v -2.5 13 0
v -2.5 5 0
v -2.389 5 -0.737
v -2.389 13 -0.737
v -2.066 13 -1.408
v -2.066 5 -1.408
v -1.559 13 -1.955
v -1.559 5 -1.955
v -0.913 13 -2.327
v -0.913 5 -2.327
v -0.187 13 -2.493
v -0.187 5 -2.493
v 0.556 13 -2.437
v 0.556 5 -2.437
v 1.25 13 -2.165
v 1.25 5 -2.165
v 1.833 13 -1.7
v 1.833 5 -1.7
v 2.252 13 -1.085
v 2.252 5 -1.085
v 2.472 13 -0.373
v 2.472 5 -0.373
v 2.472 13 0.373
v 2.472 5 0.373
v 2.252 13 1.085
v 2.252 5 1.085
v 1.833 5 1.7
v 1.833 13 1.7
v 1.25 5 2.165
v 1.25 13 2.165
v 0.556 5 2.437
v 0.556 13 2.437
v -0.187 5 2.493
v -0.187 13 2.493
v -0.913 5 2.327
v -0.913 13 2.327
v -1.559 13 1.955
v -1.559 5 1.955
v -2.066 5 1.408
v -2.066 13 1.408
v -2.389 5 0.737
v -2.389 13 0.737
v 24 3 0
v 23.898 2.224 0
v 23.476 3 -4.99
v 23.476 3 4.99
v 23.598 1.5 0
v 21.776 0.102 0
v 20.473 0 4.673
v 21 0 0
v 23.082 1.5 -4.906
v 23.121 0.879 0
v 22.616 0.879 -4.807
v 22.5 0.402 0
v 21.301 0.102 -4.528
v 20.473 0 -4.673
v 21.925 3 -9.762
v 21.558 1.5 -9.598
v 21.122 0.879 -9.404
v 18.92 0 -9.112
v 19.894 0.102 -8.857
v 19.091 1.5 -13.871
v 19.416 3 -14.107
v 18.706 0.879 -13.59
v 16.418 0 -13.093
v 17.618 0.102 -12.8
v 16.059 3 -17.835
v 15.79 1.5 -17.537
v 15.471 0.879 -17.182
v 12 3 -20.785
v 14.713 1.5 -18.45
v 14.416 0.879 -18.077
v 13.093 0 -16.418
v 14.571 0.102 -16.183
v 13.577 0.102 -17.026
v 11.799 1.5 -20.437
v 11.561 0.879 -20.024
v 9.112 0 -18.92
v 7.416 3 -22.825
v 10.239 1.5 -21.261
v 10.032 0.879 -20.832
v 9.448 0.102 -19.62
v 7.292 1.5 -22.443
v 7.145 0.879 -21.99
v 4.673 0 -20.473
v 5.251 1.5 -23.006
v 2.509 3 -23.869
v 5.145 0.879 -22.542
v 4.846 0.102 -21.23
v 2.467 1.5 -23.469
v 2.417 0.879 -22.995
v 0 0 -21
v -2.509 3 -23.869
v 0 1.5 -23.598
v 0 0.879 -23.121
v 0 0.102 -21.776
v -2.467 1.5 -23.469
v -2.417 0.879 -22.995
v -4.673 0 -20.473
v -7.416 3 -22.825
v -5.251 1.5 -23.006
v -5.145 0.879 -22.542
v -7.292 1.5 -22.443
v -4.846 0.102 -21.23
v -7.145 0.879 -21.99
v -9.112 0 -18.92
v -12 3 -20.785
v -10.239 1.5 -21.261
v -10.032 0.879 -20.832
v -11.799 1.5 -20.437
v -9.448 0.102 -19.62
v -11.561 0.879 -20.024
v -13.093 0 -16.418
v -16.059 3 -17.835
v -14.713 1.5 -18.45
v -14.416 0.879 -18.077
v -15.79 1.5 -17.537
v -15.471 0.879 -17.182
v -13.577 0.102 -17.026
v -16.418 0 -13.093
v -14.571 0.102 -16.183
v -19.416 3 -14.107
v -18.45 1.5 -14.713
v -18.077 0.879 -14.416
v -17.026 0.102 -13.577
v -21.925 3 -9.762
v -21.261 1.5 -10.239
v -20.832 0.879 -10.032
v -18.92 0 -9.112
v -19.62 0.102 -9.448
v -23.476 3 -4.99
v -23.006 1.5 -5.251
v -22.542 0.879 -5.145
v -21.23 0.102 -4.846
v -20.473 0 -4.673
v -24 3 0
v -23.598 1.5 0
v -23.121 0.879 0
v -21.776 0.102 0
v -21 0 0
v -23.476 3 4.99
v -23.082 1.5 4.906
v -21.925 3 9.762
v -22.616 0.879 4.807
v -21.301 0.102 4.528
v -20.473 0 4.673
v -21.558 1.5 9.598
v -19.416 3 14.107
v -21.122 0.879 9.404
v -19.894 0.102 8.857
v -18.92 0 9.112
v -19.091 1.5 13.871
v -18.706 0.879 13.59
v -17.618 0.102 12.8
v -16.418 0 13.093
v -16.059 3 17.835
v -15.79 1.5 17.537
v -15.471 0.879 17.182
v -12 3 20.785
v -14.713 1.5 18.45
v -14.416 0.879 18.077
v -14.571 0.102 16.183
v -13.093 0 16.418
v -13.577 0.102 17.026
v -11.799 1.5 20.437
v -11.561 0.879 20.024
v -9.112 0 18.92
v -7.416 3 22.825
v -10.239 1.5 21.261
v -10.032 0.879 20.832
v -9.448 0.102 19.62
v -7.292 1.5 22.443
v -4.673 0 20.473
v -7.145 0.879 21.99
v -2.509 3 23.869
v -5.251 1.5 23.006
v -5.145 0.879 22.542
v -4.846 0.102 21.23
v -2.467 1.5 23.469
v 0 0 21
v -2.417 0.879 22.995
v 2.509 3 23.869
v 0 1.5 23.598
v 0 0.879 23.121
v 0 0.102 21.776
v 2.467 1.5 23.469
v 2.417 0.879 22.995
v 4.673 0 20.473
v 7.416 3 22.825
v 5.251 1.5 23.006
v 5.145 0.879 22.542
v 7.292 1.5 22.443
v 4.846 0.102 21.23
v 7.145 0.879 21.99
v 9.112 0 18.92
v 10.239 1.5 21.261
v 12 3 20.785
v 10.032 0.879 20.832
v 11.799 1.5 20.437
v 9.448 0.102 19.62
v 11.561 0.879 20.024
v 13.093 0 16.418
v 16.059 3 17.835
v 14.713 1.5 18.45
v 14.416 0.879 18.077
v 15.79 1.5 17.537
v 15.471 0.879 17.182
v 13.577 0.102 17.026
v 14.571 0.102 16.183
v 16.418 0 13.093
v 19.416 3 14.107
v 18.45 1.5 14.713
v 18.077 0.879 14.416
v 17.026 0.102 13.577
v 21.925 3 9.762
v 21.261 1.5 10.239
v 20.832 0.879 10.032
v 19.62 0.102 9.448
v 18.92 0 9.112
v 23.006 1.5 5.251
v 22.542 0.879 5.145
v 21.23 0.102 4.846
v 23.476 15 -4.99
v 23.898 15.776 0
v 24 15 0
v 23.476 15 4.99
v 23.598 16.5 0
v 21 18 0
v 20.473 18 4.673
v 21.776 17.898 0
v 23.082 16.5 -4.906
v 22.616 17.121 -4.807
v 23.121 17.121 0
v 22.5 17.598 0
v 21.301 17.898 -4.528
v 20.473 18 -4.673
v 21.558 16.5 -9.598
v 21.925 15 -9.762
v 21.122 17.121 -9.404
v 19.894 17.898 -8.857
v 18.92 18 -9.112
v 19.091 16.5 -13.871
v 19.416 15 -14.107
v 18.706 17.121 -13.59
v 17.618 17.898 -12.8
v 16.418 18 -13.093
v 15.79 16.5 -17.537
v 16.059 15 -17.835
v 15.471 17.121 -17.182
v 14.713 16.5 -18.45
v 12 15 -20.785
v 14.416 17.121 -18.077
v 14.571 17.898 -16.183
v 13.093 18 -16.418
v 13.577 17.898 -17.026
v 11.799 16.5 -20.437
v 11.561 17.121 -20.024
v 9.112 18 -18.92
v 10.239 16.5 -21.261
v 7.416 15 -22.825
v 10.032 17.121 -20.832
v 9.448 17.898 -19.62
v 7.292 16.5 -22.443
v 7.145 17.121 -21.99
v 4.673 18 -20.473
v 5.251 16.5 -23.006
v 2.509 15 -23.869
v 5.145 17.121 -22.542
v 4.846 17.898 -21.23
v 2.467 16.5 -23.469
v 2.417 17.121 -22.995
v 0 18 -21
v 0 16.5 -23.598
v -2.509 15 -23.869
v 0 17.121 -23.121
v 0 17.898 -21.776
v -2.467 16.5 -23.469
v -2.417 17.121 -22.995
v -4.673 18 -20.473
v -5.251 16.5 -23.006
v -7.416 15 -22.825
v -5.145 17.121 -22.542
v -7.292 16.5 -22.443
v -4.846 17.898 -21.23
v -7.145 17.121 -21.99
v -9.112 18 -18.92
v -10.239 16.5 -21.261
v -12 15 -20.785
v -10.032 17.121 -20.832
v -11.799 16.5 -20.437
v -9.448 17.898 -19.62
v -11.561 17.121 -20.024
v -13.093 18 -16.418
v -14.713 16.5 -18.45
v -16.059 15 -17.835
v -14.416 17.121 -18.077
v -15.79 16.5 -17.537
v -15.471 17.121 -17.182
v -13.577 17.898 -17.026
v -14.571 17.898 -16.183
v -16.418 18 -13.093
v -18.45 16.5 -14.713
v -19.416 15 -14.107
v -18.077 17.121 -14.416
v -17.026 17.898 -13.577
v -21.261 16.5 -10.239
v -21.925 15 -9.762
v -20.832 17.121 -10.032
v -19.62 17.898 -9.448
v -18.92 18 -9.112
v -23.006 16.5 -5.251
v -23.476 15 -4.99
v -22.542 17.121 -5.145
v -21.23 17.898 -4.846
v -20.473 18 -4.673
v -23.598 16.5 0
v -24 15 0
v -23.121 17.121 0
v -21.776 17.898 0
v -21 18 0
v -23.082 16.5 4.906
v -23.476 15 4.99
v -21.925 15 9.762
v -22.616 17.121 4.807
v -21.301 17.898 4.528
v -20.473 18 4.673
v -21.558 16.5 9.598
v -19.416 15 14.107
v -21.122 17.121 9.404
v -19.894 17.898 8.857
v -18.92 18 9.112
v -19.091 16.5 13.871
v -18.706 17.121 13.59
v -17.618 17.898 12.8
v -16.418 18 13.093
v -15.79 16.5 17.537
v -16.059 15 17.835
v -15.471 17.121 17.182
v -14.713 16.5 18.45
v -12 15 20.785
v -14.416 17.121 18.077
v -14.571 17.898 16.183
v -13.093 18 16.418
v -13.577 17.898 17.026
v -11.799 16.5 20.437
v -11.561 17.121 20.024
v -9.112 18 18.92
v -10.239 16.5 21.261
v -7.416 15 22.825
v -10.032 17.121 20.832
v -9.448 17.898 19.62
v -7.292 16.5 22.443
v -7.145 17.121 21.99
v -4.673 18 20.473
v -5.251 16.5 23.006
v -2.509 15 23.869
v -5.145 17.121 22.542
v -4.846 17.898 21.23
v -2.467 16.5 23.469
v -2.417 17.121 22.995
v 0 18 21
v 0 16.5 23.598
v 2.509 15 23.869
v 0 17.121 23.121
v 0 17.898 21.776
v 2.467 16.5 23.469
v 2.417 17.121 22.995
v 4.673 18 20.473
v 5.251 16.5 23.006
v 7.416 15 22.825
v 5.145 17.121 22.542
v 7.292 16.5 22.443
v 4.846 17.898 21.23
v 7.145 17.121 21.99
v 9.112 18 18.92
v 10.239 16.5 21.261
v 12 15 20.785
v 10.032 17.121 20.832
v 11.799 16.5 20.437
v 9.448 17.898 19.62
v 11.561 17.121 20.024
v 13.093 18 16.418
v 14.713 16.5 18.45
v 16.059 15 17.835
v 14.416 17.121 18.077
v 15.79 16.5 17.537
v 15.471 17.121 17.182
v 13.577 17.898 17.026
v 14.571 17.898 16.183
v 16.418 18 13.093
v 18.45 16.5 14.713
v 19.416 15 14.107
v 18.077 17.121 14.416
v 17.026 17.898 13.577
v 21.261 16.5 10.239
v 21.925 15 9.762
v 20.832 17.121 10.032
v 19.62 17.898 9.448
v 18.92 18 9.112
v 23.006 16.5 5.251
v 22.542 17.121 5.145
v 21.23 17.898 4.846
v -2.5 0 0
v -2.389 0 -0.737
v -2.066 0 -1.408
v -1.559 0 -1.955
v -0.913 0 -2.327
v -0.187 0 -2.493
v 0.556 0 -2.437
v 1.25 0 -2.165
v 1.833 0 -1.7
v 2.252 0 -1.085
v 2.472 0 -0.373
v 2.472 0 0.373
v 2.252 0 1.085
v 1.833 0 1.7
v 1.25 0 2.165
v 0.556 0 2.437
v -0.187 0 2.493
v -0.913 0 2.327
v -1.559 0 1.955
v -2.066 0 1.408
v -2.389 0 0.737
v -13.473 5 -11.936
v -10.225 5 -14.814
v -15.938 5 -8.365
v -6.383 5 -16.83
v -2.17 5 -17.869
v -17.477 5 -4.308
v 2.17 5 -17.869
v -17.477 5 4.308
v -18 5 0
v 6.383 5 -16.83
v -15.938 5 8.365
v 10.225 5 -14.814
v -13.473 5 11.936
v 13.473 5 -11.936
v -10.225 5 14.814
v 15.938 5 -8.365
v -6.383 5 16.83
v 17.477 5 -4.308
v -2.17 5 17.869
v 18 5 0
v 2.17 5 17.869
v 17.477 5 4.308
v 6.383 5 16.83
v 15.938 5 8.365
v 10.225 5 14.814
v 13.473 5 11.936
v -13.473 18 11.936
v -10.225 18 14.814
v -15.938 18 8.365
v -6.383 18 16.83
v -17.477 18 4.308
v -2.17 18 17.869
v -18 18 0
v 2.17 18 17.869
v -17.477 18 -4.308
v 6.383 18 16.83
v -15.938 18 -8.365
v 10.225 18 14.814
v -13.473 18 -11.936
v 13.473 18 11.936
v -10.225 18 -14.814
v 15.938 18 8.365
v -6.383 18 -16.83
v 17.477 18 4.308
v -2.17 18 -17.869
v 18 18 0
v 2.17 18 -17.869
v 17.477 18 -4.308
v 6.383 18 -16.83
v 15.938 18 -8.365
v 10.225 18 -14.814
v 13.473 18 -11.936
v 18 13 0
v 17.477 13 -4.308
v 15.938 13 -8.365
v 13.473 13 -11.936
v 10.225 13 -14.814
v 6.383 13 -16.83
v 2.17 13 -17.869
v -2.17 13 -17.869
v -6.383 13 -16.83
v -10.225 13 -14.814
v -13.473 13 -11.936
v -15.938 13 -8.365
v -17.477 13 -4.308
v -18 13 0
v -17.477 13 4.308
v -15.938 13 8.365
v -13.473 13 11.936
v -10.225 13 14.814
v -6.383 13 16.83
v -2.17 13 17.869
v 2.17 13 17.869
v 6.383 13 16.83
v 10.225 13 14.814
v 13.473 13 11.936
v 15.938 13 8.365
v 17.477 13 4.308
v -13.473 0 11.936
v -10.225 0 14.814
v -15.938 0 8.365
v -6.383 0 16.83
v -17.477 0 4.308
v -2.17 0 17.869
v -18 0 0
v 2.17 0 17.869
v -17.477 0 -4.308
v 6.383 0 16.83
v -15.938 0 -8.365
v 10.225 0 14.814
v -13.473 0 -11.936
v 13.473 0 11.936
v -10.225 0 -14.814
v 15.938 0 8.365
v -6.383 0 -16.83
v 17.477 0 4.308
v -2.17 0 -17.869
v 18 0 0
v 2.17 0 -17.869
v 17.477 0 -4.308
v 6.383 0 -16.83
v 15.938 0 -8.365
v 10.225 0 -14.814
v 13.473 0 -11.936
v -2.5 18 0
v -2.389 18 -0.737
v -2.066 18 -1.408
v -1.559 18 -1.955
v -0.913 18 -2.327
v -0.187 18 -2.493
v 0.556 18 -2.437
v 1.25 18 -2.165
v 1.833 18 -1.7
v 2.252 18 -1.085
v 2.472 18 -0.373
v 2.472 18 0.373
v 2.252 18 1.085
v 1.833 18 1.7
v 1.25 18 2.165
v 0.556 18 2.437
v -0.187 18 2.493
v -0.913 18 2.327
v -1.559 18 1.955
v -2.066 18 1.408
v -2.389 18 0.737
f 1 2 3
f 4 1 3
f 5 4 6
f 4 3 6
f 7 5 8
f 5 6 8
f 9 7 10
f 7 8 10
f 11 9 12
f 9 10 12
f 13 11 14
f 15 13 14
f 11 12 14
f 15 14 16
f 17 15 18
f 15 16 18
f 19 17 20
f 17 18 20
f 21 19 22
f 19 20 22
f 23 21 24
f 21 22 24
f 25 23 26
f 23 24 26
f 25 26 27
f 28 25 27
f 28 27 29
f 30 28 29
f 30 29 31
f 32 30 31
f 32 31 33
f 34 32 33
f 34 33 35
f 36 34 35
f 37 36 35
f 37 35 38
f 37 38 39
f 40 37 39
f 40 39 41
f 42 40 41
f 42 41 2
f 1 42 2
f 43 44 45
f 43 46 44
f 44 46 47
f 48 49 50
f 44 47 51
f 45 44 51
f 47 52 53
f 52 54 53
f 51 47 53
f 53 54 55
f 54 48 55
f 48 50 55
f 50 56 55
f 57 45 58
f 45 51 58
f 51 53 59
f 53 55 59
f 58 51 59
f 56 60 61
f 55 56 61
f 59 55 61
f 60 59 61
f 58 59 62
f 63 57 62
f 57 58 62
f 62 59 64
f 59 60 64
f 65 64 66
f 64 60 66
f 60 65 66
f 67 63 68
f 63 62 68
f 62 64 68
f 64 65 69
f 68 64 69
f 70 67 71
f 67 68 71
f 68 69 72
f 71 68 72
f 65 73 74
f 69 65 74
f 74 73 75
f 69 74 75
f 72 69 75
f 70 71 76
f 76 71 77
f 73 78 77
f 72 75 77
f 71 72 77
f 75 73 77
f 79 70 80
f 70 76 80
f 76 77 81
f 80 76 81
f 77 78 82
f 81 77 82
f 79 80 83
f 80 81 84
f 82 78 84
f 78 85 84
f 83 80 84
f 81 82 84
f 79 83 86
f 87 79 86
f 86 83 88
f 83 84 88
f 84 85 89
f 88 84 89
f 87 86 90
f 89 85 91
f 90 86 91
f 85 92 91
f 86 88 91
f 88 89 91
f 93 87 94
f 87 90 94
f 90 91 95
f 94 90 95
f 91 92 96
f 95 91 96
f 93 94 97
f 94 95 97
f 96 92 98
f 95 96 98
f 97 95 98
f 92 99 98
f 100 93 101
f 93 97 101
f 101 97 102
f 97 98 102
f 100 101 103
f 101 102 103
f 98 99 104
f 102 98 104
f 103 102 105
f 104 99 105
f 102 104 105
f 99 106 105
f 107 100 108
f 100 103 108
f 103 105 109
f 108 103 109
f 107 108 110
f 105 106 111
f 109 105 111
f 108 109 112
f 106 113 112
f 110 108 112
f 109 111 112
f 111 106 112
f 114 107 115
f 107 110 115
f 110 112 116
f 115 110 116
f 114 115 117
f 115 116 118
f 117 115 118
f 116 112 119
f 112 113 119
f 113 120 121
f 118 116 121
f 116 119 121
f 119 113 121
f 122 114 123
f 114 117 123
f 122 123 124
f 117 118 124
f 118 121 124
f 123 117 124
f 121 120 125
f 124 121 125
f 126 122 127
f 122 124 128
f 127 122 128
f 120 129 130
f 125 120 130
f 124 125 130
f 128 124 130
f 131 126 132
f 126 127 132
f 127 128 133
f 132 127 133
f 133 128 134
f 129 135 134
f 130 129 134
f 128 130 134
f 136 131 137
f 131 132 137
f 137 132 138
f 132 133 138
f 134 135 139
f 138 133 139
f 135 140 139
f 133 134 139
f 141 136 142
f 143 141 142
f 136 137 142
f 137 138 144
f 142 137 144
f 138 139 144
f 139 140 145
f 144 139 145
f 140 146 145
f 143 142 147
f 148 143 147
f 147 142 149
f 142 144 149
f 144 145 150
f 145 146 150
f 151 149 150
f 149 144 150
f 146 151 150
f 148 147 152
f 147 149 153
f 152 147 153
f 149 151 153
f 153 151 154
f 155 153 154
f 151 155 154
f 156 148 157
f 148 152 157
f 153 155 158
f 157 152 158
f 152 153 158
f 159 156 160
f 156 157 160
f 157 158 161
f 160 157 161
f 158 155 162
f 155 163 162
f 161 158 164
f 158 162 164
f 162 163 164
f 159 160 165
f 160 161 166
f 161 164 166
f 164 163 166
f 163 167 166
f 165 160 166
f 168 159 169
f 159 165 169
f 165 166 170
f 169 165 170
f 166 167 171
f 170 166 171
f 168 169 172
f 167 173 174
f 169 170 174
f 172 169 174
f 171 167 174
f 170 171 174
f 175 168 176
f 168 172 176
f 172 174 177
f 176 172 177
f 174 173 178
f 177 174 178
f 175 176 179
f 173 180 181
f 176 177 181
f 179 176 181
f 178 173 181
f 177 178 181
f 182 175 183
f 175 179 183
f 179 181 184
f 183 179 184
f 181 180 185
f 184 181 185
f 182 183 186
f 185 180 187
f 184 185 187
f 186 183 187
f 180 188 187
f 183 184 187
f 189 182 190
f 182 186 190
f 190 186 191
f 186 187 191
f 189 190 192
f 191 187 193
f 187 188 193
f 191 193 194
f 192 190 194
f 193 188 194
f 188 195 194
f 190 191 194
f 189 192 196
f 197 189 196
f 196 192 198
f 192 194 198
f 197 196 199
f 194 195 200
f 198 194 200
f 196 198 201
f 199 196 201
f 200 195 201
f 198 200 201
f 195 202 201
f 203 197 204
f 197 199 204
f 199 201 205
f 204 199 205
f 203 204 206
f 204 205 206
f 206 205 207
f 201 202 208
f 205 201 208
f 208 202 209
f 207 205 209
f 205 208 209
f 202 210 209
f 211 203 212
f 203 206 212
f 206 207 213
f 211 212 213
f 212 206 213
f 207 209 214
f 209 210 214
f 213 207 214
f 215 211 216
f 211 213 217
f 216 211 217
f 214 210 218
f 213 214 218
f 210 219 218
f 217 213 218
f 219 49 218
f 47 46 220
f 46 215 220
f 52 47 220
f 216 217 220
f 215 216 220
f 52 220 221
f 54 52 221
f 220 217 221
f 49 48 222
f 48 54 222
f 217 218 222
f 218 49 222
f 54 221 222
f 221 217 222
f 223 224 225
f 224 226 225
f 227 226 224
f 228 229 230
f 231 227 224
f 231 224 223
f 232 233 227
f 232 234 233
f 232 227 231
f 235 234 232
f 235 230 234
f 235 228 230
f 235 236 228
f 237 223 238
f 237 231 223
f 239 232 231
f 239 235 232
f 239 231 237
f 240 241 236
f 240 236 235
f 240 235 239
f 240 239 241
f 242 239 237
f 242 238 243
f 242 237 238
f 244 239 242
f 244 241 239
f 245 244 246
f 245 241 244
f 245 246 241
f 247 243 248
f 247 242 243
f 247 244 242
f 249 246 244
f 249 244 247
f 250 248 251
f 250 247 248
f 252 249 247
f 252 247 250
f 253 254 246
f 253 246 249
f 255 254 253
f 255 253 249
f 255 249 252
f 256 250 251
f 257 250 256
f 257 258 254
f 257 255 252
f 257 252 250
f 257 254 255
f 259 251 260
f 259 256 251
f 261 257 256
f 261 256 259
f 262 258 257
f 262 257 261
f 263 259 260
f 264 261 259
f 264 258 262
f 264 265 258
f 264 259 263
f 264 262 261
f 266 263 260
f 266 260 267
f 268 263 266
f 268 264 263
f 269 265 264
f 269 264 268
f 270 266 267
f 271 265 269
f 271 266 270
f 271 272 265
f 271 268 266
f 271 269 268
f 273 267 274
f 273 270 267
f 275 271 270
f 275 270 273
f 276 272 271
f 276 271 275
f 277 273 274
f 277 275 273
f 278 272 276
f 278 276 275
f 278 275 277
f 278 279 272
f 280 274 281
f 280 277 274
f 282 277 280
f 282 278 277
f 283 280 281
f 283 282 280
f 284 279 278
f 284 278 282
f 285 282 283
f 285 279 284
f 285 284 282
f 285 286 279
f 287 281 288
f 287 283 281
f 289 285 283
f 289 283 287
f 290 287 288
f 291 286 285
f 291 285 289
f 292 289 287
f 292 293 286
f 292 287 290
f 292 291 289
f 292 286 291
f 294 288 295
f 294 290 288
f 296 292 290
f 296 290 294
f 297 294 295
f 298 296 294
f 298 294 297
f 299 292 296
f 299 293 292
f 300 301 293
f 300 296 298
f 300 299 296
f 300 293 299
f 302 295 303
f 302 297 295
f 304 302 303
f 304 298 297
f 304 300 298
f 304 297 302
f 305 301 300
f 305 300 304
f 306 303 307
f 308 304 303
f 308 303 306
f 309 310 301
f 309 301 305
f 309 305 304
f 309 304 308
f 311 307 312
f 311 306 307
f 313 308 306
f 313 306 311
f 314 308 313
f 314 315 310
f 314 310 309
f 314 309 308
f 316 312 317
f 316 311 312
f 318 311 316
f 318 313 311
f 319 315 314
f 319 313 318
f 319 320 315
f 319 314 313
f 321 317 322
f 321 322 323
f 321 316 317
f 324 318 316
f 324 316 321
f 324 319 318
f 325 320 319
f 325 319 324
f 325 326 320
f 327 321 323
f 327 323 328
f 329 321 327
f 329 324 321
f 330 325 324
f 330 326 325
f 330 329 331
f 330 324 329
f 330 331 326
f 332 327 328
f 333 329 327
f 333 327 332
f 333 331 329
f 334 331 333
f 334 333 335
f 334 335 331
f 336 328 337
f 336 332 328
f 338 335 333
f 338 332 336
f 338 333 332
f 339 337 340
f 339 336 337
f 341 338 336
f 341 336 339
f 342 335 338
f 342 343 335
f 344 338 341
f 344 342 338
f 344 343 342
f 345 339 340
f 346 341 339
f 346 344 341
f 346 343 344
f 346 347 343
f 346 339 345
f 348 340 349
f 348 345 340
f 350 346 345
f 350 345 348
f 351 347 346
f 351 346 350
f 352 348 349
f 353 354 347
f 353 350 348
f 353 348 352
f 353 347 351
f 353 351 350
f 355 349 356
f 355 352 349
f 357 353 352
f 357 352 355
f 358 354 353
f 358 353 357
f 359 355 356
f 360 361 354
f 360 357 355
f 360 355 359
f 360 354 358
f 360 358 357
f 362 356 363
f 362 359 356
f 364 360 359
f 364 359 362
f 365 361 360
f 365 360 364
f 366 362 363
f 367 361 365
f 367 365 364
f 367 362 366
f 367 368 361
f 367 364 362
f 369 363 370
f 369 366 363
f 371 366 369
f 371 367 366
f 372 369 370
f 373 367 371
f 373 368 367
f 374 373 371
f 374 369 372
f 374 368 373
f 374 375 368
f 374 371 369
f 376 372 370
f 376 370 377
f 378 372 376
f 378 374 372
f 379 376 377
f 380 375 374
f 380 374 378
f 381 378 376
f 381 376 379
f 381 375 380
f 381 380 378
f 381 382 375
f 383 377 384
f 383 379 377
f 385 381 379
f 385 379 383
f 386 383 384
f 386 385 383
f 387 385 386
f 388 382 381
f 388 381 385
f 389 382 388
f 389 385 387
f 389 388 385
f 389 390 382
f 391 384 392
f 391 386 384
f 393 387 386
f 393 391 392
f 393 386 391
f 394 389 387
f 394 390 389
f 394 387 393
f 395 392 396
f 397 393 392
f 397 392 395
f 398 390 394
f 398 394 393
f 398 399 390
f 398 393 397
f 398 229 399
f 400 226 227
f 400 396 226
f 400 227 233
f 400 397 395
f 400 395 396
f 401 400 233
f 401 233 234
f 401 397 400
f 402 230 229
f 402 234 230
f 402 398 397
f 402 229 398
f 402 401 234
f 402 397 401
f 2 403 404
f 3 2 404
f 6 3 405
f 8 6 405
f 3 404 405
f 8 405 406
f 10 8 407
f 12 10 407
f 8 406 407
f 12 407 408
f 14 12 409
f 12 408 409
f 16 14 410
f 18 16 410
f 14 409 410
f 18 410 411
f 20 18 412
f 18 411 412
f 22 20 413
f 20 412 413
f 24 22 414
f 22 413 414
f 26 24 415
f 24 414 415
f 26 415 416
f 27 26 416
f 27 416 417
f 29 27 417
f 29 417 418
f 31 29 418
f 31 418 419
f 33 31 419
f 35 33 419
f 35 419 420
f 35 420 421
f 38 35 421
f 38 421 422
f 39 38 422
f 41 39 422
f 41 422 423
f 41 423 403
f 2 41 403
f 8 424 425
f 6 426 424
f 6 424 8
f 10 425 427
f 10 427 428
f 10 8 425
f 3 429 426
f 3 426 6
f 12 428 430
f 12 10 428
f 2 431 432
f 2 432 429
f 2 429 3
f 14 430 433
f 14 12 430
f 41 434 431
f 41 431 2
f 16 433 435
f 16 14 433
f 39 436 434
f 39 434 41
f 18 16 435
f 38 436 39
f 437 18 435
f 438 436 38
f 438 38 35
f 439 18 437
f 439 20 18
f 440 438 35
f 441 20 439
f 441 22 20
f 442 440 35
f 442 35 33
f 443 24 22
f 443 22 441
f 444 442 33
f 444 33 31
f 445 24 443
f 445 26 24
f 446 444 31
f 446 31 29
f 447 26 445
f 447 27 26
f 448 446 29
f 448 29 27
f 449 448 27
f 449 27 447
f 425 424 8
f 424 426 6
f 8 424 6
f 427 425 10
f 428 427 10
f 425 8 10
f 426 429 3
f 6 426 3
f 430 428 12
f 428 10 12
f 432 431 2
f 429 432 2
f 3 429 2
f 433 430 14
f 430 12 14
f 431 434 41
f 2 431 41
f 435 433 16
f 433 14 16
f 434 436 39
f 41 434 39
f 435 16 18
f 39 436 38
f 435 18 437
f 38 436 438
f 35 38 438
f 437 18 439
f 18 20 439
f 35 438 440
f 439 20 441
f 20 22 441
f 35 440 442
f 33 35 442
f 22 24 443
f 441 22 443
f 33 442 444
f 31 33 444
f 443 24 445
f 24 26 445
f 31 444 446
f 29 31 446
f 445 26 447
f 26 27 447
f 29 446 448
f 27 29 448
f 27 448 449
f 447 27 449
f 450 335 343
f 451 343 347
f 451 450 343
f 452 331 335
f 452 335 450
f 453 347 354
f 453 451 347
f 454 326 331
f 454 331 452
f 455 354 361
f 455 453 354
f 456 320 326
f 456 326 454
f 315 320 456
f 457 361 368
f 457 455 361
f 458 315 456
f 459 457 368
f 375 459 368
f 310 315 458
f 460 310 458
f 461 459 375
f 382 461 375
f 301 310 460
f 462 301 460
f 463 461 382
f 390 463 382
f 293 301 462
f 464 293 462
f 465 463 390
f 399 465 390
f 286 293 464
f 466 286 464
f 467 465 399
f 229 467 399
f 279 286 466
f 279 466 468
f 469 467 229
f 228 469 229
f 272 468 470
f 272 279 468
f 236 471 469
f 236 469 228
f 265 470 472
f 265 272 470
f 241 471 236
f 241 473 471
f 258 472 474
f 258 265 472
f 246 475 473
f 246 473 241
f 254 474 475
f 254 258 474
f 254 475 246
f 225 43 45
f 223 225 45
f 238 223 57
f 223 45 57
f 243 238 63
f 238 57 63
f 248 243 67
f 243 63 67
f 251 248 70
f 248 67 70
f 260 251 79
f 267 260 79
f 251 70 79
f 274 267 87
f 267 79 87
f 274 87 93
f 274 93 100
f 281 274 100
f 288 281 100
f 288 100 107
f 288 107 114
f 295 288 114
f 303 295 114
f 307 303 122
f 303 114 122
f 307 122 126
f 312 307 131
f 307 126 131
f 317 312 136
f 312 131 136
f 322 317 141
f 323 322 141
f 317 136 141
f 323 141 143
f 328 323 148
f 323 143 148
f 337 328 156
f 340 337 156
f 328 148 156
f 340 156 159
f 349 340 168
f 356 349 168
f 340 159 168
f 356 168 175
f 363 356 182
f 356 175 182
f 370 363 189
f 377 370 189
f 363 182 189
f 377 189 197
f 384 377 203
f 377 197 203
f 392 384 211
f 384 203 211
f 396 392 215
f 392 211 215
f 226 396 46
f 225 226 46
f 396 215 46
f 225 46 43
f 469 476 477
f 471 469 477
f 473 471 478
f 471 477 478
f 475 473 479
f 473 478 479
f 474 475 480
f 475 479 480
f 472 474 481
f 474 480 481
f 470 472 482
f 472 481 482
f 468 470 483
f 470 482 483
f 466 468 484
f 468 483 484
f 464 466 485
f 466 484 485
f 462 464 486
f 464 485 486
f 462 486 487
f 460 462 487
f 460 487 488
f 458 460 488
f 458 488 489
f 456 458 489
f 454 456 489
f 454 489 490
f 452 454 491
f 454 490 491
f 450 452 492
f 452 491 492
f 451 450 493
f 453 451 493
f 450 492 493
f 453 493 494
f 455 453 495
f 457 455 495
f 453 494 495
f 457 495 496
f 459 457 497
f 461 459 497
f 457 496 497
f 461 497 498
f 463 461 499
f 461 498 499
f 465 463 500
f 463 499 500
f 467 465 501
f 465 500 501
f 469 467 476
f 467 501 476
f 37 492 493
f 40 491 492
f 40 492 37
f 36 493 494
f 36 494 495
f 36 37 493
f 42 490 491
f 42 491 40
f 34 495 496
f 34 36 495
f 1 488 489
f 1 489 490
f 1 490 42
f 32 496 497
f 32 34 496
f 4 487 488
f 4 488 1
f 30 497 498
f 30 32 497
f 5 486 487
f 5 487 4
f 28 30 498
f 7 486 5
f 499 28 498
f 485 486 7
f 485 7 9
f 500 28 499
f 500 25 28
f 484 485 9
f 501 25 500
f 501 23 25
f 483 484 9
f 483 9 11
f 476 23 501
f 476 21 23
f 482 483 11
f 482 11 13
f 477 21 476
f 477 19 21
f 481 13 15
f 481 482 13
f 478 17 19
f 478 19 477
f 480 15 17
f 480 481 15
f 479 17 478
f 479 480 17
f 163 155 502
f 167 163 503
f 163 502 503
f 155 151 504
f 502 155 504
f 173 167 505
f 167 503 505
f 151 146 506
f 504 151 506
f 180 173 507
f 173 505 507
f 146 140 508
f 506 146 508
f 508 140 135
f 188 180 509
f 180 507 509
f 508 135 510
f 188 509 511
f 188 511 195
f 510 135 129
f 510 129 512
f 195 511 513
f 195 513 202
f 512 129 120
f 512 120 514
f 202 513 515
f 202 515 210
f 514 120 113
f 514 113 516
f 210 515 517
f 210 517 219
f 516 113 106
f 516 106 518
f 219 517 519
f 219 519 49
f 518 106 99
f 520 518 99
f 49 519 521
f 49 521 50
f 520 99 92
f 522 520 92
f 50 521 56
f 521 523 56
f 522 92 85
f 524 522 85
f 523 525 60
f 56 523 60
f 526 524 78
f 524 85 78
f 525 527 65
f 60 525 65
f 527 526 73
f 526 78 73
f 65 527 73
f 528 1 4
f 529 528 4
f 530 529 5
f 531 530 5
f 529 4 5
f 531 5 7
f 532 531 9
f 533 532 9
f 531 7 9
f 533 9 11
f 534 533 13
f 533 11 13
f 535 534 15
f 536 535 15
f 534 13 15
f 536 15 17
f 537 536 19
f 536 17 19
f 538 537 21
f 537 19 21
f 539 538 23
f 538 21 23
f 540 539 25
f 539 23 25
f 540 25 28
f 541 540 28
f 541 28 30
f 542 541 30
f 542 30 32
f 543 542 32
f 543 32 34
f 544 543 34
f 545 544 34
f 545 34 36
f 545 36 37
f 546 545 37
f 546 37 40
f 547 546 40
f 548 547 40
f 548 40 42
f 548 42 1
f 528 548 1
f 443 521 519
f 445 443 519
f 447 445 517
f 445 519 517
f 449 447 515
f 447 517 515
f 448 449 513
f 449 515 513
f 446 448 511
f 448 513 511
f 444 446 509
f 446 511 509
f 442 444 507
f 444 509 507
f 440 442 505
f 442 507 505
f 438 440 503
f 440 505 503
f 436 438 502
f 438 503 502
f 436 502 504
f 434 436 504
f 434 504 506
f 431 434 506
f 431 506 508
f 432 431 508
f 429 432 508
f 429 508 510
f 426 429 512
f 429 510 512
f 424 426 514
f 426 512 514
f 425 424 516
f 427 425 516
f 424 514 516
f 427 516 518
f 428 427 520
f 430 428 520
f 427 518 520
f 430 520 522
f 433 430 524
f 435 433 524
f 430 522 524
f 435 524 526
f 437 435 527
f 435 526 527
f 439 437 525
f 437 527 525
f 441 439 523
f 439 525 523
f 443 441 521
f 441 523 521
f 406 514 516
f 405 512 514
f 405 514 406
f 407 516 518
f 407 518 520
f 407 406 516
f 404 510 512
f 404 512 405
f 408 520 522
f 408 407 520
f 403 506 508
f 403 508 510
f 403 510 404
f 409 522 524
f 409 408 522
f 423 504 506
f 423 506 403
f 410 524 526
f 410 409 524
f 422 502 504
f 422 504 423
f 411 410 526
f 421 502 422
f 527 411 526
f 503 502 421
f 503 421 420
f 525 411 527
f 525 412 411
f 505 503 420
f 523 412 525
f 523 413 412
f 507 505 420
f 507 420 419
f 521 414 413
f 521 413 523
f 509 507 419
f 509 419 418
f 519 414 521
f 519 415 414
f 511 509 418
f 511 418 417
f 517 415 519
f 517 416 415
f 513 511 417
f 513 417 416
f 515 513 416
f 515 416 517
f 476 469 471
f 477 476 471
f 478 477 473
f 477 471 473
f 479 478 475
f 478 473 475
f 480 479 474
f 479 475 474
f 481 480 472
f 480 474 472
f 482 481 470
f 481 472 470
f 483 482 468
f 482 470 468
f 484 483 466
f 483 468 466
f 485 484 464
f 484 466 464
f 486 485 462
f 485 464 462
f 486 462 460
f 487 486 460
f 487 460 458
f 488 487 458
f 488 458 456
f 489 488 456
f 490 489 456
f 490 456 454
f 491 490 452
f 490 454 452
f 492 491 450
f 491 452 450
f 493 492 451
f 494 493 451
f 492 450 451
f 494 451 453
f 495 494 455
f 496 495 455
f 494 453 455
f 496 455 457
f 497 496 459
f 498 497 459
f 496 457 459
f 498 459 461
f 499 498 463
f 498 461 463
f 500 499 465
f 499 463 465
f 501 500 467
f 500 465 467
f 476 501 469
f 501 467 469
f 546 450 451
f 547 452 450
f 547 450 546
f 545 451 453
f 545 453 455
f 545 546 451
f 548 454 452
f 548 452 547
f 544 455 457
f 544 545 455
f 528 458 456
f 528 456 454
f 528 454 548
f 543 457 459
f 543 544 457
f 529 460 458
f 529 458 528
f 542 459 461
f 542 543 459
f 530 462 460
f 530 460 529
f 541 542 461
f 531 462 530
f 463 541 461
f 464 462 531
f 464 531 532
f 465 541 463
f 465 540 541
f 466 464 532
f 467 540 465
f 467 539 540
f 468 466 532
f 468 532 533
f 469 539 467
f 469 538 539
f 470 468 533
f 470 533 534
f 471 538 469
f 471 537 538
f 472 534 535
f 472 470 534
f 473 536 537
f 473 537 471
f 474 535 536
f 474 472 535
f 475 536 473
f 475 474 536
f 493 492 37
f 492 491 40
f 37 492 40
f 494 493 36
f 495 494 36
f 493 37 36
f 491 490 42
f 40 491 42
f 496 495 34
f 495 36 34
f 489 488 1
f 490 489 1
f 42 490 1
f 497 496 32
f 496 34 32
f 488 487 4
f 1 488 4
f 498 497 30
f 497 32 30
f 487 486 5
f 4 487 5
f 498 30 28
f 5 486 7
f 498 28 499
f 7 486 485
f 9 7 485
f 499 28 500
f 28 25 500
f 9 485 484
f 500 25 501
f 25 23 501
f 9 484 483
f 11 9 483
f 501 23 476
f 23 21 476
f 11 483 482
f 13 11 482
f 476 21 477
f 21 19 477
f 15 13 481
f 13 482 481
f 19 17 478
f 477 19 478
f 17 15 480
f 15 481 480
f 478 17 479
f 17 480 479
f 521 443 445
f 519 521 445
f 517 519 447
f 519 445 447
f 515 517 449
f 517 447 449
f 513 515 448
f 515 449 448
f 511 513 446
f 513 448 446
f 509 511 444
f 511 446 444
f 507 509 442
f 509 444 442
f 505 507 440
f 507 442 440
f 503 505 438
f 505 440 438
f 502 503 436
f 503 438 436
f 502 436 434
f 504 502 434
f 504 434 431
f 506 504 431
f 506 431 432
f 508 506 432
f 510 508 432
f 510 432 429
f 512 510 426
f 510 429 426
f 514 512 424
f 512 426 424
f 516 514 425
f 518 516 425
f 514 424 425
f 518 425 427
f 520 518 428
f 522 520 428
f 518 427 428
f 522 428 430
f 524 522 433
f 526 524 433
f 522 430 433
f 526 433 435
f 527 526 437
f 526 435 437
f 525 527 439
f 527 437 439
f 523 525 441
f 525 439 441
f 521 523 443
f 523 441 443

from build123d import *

# Parameters (mm, degrees)
SKETCH1_R           = 24
BOSS_EXTRUDE1_DEPTH = 18
SKETCH2_R           = 18
CUT_EXTRUDE1_DEPTH  = 5
SKETCH3_R           = 18
CUT_EXTRUDE2_DEPTH  = 5
SKETCH4_R           = 18
BOSS_EXTRUDE2_DEPTH = 5
SKETCH5_R           = 18
BOSS_EXTRUDE3_DEPTH = 5
SKETCH6_R           = 2.5
CUT_EXTRUDE3_DEPTH  = 19
FILLET1_R           = 3


with BuildPart() as part:
    # Sketch1 → Boss-Extrude1 (new body)
    with BuildSketch(Plane(origin=(0, 0, 0), x_dir=(1, 0, 0), z_dir=(0, 1, 0))):
        Circle(SKETCH1_R)
    extrude(amount=BOSS_EXTRUDE1_DEPTH)

    # Sketch2 → Cut-Extrude1 (cut)
    with BuildSketch(Plane(origin=(0, 18, 0), x_dir=(1, 0, 0), z_dir=(0, 1, 0))):
        Circle(SKETCH2_R)
    extrude(amount=-CUT_EXTRUDE1_DEPTH, mode=Mode.SUBTRACT)

    # Sketch3 → Cut-Extrude2 (cut)
    with BuildSketch(Plane.XZ):
        Circle(SKETCH3_R)
    extrude(amount=-CUT_EXTRUDE2_DEPTH, mode=Mode.SUBTRACT)


with BuildPart() as body_2:
    # Sketch4 → Boss-Extrude2 (new body)
    with BuildSketch(Plane(origin=(0, 13, 0), x_dir=(1, 0, 0), z_dir=(0, 1, 0))):
        Circle(SKETCH4_R)
    extrude(amount=BOSS_EXTRUDE2_DEPTH)


with BuildPart() as body_3:
    # Sketch5 → Boss-Extrude3 (new body)
    with BuildSketch(Plane.XZ.offset(-5)):
        Circle(SKETCH5_R)
    extrude(amount=BOSS_EXTRUDE3_DEPTH)


with BuildPart() as cut_extrude3_tool:
    # Sketch6 → Cut-Extrude3 (new body, through all)
    with BuildSketch(Plane(origin=(0, 0, 0), x_dir=(-1, 0, 0), z_dir=(0, -1, 0))):
        Circle(SKETCH6_R)
    extrude(amount=-CUT_EXTRUDE3_DEPTH)


with BuildPart() as part_1:
    add(part.part)

    # Cut-Extrude3: cut by cut_extrude3_tool
    add(cut_extrude3_tool.part, mode=Mode.SUBTRACT)

    # Fillet1
    fillet1_edges = [part_1.edges().sort_by_distance(p)[0] for p in [
        (-24, 0, 0),
        (-24, 18, 0),
    ]]
    fillet(fillet1_edges, radius=FILLET1_R)


with BuildPart() as body_2_1:
    add(body_2.part)

    # Cut-Extrude3: cut by cut_extrude3_tool
    add(cut_extrude3_tool.part, mode=Mode.SUBTRACT)


with BuildPart() as body_3_1:
    add(body_3.part)

    # Cut-Extrude3: cut by cut_extrude3_tool
    add(cut_extrude3_tool.part, mode=Mode.SUBTRACT)


solid = Compound([part_1.part, body_2_1.part, body_3_1.part])
